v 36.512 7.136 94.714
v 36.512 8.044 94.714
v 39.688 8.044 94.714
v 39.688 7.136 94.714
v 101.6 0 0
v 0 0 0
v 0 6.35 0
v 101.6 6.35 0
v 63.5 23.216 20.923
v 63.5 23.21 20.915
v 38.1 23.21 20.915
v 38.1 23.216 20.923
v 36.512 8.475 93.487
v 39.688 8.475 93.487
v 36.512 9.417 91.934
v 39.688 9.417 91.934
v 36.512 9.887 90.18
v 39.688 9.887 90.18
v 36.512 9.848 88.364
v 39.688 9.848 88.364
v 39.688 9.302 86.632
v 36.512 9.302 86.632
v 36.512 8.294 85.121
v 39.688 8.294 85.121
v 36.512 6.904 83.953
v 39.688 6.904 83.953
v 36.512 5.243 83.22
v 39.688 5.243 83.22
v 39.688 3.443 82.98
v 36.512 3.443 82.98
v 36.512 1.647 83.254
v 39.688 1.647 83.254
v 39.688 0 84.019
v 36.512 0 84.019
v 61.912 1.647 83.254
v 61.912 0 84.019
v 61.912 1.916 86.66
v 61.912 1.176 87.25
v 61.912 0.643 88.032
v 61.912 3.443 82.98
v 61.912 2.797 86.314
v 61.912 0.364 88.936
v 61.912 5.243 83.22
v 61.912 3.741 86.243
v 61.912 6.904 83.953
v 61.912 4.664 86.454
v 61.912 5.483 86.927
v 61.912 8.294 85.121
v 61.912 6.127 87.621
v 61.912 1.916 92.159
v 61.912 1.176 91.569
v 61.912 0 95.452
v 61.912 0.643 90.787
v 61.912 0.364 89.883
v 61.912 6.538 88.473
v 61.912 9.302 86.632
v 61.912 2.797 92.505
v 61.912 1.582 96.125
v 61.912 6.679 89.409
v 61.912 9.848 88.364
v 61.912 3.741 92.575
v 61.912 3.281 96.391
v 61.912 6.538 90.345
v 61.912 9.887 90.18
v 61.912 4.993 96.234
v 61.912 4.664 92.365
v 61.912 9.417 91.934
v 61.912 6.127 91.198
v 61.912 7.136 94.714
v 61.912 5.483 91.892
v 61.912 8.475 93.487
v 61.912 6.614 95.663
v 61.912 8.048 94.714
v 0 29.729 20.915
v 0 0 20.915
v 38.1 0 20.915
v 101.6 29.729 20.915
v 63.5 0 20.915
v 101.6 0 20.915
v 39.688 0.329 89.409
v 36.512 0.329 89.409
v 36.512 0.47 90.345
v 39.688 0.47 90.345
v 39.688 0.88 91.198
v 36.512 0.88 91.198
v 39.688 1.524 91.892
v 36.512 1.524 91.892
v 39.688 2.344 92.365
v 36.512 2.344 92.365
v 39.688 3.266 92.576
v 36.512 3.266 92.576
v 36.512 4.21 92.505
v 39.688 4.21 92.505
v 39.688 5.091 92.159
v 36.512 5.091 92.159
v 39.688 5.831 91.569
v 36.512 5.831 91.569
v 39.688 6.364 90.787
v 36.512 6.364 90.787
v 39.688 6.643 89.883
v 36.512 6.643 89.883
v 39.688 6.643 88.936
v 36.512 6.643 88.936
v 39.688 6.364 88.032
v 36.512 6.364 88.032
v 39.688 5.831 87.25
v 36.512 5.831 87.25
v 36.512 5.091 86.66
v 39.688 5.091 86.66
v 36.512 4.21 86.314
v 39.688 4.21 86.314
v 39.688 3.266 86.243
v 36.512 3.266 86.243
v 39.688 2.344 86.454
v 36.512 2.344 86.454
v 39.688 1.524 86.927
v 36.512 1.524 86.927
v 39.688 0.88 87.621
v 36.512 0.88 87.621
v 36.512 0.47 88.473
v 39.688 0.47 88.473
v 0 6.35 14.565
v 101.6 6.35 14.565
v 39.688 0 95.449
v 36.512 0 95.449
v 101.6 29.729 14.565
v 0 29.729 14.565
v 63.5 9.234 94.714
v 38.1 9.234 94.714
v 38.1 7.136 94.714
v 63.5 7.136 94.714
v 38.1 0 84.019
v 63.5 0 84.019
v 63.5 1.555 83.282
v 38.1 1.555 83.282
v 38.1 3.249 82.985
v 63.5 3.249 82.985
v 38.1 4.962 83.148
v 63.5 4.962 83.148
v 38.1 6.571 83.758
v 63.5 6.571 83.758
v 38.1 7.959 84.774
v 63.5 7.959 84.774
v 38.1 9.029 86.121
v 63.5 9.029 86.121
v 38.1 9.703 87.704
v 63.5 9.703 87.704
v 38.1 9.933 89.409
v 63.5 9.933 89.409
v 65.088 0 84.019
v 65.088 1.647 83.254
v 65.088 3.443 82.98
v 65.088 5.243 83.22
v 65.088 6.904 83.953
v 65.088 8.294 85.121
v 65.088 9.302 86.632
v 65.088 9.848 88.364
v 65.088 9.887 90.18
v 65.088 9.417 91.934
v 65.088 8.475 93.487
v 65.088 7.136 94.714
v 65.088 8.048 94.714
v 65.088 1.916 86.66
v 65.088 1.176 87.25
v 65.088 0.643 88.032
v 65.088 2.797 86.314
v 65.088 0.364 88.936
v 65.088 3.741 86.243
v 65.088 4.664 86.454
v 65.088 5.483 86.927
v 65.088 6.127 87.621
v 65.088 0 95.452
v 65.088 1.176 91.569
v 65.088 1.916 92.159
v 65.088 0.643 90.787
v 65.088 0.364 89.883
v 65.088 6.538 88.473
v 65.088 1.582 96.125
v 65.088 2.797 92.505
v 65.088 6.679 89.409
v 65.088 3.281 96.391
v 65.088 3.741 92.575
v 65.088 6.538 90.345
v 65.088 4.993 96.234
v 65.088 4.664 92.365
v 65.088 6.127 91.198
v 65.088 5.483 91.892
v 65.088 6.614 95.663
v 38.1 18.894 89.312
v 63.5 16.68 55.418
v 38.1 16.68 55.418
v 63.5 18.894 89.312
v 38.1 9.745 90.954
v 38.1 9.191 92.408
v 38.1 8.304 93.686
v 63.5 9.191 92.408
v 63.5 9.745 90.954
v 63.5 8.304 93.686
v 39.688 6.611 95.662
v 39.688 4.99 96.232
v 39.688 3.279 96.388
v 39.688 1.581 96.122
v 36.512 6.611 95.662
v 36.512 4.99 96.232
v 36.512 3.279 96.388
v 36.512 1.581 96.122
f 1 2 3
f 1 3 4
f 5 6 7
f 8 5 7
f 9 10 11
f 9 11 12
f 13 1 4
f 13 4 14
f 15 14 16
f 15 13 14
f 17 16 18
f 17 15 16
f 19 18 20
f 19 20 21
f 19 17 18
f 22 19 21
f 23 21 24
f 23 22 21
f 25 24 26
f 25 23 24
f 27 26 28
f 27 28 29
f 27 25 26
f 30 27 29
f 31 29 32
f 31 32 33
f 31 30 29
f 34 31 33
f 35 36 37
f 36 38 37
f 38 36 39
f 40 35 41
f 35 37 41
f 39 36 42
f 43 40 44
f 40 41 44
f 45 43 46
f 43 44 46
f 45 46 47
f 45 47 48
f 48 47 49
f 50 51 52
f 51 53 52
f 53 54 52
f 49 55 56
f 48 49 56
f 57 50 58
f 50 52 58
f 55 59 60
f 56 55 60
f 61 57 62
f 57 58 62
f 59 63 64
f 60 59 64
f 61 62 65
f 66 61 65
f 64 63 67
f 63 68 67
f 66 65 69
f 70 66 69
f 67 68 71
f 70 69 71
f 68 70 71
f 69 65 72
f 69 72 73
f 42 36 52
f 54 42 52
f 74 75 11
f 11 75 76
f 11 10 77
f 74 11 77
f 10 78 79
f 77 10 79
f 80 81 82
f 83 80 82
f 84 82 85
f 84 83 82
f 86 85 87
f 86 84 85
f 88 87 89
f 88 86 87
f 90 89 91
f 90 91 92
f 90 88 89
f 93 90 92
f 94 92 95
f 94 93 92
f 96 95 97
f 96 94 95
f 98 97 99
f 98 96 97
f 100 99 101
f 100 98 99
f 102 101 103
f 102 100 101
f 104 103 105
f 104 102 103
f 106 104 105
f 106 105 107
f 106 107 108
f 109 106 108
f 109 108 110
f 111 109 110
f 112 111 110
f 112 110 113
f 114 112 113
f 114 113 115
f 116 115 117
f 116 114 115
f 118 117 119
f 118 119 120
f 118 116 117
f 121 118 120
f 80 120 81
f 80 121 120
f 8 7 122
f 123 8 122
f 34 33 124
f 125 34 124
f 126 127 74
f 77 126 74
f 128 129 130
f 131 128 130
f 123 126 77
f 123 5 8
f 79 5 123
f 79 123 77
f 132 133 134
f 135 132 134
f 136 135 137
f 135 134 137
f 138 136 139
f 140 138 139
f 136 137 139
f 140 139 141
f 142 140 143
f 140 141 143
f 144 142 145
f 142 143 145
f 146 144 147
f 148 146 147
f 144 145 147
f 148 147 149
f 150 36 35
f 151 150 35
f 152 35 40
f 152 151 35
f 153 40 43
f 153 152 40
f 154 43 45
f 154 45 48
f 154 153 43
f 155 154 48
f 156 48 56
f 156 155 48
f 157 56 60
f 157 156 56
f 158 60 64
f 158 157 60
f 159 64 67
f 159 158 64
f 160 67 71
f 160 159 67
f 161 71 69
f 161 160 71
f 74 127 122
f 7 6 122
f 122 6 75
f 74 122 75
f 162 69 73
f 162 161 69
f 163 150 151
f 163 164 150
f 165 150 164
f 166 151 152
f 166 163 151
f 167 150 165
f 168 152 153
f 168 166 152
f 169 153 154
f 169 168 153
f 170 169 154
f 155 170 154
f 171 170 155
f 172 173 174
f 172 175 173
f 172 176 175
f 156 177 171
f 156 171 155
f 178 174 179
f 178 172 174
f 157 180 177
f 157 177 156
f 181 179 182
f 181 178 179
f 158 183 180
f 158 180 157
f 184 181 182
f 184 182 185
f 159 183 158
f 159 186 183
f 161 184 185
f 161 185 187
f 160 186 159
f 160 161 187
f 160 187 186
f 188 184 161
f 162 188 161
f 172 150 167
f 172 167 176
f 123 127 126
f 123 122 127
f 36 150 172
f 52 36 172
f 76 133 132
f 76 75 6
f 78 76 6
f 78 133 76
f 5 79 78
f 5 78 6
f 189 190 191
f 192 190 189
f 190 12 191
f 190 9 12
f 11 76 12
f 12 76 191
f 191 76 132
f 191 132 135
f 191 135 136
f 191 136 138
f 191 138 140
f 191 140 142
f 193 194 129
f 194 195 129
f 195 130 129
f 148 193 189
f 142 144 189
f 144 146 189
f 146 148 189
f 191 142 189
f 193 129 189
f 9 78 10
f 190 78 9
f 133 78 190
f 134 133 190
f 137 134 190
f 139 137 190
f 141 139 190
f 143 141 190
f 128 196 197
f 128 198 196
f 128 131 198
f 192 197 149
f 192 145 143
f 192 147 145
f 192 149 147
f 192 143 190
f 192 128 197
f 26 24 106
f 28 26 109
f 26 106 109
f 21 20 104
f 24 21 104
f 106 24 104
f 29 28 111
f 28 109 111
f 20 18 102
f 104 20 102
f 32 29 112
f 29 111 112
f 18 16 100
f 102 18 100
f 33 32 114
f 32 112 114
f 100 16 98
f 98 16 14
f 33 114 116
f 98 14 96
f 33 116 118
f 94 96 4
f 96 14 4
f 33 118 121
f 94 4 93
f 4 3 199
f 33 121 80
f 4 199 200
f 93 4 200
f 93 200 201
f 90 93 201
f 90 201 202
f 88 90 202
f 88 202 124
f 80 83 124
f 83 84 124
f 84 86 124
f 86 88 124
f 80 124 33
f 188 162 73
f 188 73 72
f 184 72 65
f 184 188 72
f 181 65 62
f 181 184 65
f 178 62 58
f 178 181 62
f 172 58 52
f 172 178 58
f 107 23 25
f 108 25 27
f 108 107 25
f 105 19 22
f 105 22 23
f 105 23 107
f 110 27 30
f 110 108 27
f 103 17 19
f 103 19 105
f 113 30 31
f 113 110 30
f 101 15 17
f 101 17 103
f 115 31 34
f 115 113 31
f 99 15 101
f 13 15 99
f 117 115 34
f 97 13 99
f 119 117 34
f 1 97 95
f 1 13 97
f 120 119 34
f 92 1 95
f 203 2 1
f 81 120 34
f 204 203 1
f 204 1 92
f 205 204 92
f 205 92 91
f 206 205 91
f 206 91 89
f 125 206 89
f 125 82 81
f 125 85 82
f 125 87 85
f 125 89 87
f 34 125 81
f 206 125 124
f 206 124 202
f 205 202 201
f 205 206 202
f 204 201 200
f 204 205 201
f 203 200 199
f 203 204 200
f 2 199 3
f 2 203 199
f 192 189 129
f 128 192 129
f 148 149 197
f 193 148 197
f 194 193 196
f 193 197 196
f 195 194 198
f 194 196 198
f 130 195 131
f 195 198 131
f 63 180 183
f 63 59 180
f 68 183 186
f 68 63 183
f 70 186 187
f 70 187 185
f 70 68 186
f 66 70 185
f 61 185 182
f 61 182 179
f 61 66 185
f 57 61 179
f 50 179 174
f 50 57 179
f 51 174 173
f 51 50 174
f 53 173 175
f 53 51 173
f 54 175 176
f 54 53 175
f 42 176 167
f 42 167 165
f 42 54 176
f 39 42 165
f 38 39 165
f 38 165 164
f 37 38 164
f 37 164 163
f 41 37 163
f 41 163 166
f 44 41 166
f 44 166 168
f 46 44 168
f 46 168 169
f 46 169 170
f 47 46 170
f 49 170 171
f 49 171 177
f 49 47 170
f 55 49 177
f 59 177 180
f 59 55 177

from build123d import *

# Parameters (mm, degrees)
F1_DEPTH      = 101.6
F4_DEPTH      = 12.7
F4_DEPTH_BACK = 12.7
F6_DEPTH      = 25.4
F7_DEPTH      = 6.35
F9_R          = 3.1750969971
F10_DEPTH     = 1.5875
F8_R          = 3.175
F11_DEPTH     = 1.5875
F12_W         = 12.8773497418
F12_H         = 30.8604761958
F13_DEPTH     = 127


with BuildPart() as f1:
    # F0 (on Right) → F1 (new body)
    with BuildSketch(Plane.YZ):
        Polygon((0, 14.5646330879), (0, 0), (6.35, 0), (6.35, 14.5646330879), (12.7, 14.5646330879), (23.3790262025, 14.5646330879), (23.3790262025, 20.9146330879), (0, 20.9146330879), align=None)
    extrude(amount=F1_DEPTH)

    # F3 (on offset) → F4 (join, two sides)
    with BuildSketch(Plane.YZ.offset(50.8)) as f4_sk:
        Polygon((0, 94.7142243385), (0, 18.5392871499), (19.907515496, 16.7202148587), (23.2162494212, 20.9232009947), (16.6799279355, 55.4184156182), (18.8936255872, 89.3121510744), (9.2339664698, 94.7142243385), align=None)
    extrude(amount=F4_DEPTH)
    extrude(f4_sk.sketch, amount=-F4_DEPTH_BACK)

    # F5 (on face) → F6 (cut)
    with BuildSketch(Plane.YZ.offset(63.5)):
        with BuildLine():
            Line((0, 94.7142243385), (7.1361868072, 94.7142243385))
            ThreePointArc((7.1361868072, 94.7142243385), (-1.8445002334, 92.9776508861), (0, 84.018507737))
            Line((0, 84.018507737), (0, 94.7142243385))
        make_face()
        with BuildLine():
            ThreePointArc((0, 84.018507737), (6.5705000835, 83.7584694055), (9.9331201889, 89.4092991948))
            ThreePointArc((9.9331201889, 89.4092991948), (9.1910640748, 92.407843305), (7.1361868072, 94.7142243385))
            Line((7.1361868072, 94.7142243385), (0, 94.7142243385))
            Line((0, 94.7142243385), (0, 84.018507737))
        make_face()
    extrude(amount=-F6_DEPTH, mode=Mode.SUBTRACT)

    # F7 (add): a face of the model
    f7_faces = [f1.faces().sort_by_distance(p)[0] for p in [
        (50.8, 23.3790262025, 17.7396330879),
    ]]
    extrude(f7_faces, amount=F7_DEPTH)


with BuildPart() as f10:
    # F9 (on face) → F10 (new body, symmetric)
    with BuildSketch(Plane(origin=(38.1, 0, 0), x_dir=(0, -1, 0), z_dir=(-1, 0, 0))):
        with BuildLine():
            ThreePointArc((0, 83.3692482057), (2.5470454574, 85.9241336529), (3.4789796589, 89.4092991948))
            ThreePointArc((3.4789796589, 89.4092991948), (-0.5837001335, 95.7521521156), (-8.0442534776, 94.7142243385))
            Line((-8.0442534776, 94.7142243385), (-7.1361868072, 94.7142243385))
            ThreePointArc((-7.1361868072, 94.7142243385), (-8.8519906113, 85.8409475035), (0, 84.018507737))
            Line((0, 84.018507737), (0, 83.3692482057))
        make_face()
        with Locations((-3.5037451889, 89.4092991948)):
            Circle(F9_R, mode=Mode.SUBTRACT)
    extrude(amount=F10_DEPTH, both=True)


with BuildPart() as f11:
    # F8 (on face) → F11 (new body, symmetric)
    with BuildSketch(Plane.YZ.offset(63.5)):
        with BuildLine():
            Line((7.1361868072, 94.7142243385), (8.0477515951, 94.7142243385))
            ThreePointArc((8.0477515951, 94.7142243385), (-2.1938488305, 93.4500475649), (0, 83.3666181135))
            Line((0, 83.3666181135), (0, 84.018507737))
            ThreePointArc((0, 84.018507737), (8.8519906113, 85.8409475035), (7.1361868072, 94.7142243385))
        make_face()
        with Locations((3.5037451889, 89.4092991948)):
            Circle(F8_R, mode=Mode.SUBTRACT)
    extrude(amount=F11_DEPTH, both=True)


with BuildPart() as f13_tool:
    # F12 (on face) → F13 (new body)
    with BuildSketch(Plane.YZ.offset(101.6)):
        with Locations((-6.4386748709, 83.3296589553)):
            Rectangle(F12_W, F12_H)
    extrude(amount=-F13_DEPTH)


with BuildPart() as f10_1:
    add(f10.part)

    # F13: cut by f13_tool
    add(f13_tool.part, mode=Mode.SUBTRACT)


with BuildPart() as f11_1:
    add(f11.part)

    # F13: cut by f13_tool
    add(f13_tool.part, mode=Mode.SUBTRACT)


solid = Compound([f1.part, f10_1.part, f11_1.part])
